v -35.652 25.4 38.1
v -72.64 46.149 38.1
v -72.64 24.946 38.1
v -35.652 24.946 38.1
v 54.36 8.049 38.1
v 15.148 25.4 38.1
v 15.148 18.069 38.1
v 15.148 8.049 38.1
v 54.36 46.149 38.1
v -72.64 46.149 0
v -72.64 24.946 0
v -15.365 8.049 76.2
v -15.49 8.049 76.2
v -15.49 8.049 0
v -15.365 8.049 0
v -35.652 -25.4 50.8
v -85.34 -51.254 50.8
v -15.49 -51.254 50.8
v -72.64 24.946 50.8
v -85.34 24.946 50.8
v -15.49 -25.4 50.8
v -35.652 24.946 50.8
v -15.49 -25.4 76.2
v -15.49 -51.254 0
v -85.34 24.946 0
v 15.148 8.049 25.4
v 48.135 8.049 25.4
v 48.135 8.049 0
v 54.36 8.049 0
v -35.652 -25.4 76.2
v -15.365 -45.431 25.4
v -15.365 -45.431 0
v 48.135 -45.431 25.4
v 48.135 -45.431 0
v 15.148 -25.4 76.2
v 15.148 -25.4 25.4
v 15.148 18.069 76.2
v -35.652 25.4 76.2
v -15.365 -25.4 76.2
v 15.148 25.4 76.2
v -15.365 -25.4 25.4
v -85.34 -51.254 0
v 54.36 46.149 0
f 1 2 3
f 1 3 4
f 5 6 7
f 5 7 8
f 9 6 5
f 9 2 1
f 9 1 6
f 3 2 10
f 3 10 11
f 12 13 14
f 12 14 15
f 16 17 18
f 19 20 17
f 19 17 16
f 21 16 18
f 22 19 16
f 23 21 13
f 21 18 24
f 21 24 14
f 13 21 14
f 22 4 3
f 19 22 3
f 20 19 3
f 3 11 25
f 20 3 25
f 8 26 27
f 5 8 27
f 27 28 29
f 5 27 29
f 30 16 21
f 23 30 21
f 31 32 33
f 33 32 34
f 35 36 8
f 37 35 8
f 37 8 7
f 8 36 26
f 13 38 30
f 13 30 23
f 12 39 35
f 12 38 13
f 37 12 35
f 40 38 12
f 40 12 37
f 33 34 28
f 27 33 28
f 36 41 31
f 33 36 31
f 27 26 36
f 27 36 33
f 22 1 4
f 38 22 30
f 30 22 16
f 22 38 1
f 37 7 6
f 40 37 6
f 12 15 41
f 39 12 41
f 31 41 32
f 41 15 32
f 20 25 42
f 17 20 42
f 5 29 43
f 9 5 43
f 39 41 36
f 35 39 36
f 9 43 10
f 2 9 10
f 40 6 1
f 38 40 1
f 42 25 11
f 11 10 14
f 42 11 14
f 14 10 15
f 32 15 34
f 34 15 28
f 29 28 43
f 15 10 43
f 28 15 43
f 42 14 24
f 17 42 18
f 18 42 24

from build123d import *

# Parameters (mm, degrees)
F0_W     = 20.1616674036
F0_H     = 16.8965275351
F0_W_2   = 30.5136305556
F0_H_2   = 10.0199187398
F0_H_3   = 33.4494321883
F1_DEPTH = 76.2
F0_W_3   = 36.9883325964
F2_DEPTH = 50.8
F0_W_4   = 32.9863694444
F3_DEPTH = 38.1
F4_DEPTH = 25.4


with BuildPart() as f1:
    # F0 (on Top) → F1 (new body)
    with BuildSketch(Plane.XY):
        with Locations((-25.5707731128, 16.4976959558)):
            Rectangle(F0_W, F0_H)
        Polygon((-35.6516068146, 25.4), (-35.6516068146, 24.9459597234), (-15.489939411, 24.9459597234), (-15.489939411, 8.0494321883), (-15.3652373701, 8.0494321883), (-15.3652373701, 18.0693509281), (15.1483931854, 18.0693509281), (15.1483931854, 25.4), align=None)
        with Locations((-0.1084220923, 13.0593915582)):
            Rectangle(F0_W_2, F0_H_2)
        with Locations((-0.1084220923, -8.6752839059)):
            Rectangle(F0_W_2, F0_H_3)
        with Locations((-25.5707731128, -8.6752839059)):
            Rectangle(F0_W, F0_H_3)
    extrude(amount=F1_DEPTH)

    # F0 (on Top) → F2 (join)
    with BuildSketch(Plane.XY):
        Polygon((-72.639939411, 24.9459597234), (-85.339939411, 24.9459597234), (-85.339939411, -51.2540402766), (-15.489939411, -51.2540402766), (-15.489939411, -25.4), (-35.6516068146, -25.4), (-35.6516068146, 8.0494321883), (-72.639939411, 8.0494321883), align=None)
        with Locations((-54.1457731128, 16.4976959558)):
            Rectangle(F0_W_3, F0_H)
    extrude(amount=F2_DEPTH)

    # F0 (on Top) → F3 (join)
    with BuildSketch(Plane.XY):
        Polygon((-72.639939411, 46.1494321883), (-72.639939411, 24.9459597234), (-35.6516068146, 24.9459597234), (-35.6516068146, 25.4), (15.1483931854, 25.4), (15.1483931854, 18.0693509281), (48.1347626299, 18.0693509281), (48.1347626299, 8.0494321883), (54.360060589, 8.0494321883), (54.360060589, 46.1494321883), align=None)
        with Locations((31.6415779077, 13.0593915582)):
            Rectangle(F0_W_4, F0_H_2)
    extrude(amount=F3_DEPTH)

    # F0 (on Top) → F4 (join)
    with BuildSketch(Plane.XY):
        Polygon((15.1483931854, -25.4), (-15.3652373701, -25.4), (-15.3652373701, -45.4306490719), (48.1347626299, -45.4306490719), (48.1347626299, 8.0494321883), (15.1483931854, 8.0494321883), align=None)
    extrude(amount=F4_DEPTH)


solid = f1.part
